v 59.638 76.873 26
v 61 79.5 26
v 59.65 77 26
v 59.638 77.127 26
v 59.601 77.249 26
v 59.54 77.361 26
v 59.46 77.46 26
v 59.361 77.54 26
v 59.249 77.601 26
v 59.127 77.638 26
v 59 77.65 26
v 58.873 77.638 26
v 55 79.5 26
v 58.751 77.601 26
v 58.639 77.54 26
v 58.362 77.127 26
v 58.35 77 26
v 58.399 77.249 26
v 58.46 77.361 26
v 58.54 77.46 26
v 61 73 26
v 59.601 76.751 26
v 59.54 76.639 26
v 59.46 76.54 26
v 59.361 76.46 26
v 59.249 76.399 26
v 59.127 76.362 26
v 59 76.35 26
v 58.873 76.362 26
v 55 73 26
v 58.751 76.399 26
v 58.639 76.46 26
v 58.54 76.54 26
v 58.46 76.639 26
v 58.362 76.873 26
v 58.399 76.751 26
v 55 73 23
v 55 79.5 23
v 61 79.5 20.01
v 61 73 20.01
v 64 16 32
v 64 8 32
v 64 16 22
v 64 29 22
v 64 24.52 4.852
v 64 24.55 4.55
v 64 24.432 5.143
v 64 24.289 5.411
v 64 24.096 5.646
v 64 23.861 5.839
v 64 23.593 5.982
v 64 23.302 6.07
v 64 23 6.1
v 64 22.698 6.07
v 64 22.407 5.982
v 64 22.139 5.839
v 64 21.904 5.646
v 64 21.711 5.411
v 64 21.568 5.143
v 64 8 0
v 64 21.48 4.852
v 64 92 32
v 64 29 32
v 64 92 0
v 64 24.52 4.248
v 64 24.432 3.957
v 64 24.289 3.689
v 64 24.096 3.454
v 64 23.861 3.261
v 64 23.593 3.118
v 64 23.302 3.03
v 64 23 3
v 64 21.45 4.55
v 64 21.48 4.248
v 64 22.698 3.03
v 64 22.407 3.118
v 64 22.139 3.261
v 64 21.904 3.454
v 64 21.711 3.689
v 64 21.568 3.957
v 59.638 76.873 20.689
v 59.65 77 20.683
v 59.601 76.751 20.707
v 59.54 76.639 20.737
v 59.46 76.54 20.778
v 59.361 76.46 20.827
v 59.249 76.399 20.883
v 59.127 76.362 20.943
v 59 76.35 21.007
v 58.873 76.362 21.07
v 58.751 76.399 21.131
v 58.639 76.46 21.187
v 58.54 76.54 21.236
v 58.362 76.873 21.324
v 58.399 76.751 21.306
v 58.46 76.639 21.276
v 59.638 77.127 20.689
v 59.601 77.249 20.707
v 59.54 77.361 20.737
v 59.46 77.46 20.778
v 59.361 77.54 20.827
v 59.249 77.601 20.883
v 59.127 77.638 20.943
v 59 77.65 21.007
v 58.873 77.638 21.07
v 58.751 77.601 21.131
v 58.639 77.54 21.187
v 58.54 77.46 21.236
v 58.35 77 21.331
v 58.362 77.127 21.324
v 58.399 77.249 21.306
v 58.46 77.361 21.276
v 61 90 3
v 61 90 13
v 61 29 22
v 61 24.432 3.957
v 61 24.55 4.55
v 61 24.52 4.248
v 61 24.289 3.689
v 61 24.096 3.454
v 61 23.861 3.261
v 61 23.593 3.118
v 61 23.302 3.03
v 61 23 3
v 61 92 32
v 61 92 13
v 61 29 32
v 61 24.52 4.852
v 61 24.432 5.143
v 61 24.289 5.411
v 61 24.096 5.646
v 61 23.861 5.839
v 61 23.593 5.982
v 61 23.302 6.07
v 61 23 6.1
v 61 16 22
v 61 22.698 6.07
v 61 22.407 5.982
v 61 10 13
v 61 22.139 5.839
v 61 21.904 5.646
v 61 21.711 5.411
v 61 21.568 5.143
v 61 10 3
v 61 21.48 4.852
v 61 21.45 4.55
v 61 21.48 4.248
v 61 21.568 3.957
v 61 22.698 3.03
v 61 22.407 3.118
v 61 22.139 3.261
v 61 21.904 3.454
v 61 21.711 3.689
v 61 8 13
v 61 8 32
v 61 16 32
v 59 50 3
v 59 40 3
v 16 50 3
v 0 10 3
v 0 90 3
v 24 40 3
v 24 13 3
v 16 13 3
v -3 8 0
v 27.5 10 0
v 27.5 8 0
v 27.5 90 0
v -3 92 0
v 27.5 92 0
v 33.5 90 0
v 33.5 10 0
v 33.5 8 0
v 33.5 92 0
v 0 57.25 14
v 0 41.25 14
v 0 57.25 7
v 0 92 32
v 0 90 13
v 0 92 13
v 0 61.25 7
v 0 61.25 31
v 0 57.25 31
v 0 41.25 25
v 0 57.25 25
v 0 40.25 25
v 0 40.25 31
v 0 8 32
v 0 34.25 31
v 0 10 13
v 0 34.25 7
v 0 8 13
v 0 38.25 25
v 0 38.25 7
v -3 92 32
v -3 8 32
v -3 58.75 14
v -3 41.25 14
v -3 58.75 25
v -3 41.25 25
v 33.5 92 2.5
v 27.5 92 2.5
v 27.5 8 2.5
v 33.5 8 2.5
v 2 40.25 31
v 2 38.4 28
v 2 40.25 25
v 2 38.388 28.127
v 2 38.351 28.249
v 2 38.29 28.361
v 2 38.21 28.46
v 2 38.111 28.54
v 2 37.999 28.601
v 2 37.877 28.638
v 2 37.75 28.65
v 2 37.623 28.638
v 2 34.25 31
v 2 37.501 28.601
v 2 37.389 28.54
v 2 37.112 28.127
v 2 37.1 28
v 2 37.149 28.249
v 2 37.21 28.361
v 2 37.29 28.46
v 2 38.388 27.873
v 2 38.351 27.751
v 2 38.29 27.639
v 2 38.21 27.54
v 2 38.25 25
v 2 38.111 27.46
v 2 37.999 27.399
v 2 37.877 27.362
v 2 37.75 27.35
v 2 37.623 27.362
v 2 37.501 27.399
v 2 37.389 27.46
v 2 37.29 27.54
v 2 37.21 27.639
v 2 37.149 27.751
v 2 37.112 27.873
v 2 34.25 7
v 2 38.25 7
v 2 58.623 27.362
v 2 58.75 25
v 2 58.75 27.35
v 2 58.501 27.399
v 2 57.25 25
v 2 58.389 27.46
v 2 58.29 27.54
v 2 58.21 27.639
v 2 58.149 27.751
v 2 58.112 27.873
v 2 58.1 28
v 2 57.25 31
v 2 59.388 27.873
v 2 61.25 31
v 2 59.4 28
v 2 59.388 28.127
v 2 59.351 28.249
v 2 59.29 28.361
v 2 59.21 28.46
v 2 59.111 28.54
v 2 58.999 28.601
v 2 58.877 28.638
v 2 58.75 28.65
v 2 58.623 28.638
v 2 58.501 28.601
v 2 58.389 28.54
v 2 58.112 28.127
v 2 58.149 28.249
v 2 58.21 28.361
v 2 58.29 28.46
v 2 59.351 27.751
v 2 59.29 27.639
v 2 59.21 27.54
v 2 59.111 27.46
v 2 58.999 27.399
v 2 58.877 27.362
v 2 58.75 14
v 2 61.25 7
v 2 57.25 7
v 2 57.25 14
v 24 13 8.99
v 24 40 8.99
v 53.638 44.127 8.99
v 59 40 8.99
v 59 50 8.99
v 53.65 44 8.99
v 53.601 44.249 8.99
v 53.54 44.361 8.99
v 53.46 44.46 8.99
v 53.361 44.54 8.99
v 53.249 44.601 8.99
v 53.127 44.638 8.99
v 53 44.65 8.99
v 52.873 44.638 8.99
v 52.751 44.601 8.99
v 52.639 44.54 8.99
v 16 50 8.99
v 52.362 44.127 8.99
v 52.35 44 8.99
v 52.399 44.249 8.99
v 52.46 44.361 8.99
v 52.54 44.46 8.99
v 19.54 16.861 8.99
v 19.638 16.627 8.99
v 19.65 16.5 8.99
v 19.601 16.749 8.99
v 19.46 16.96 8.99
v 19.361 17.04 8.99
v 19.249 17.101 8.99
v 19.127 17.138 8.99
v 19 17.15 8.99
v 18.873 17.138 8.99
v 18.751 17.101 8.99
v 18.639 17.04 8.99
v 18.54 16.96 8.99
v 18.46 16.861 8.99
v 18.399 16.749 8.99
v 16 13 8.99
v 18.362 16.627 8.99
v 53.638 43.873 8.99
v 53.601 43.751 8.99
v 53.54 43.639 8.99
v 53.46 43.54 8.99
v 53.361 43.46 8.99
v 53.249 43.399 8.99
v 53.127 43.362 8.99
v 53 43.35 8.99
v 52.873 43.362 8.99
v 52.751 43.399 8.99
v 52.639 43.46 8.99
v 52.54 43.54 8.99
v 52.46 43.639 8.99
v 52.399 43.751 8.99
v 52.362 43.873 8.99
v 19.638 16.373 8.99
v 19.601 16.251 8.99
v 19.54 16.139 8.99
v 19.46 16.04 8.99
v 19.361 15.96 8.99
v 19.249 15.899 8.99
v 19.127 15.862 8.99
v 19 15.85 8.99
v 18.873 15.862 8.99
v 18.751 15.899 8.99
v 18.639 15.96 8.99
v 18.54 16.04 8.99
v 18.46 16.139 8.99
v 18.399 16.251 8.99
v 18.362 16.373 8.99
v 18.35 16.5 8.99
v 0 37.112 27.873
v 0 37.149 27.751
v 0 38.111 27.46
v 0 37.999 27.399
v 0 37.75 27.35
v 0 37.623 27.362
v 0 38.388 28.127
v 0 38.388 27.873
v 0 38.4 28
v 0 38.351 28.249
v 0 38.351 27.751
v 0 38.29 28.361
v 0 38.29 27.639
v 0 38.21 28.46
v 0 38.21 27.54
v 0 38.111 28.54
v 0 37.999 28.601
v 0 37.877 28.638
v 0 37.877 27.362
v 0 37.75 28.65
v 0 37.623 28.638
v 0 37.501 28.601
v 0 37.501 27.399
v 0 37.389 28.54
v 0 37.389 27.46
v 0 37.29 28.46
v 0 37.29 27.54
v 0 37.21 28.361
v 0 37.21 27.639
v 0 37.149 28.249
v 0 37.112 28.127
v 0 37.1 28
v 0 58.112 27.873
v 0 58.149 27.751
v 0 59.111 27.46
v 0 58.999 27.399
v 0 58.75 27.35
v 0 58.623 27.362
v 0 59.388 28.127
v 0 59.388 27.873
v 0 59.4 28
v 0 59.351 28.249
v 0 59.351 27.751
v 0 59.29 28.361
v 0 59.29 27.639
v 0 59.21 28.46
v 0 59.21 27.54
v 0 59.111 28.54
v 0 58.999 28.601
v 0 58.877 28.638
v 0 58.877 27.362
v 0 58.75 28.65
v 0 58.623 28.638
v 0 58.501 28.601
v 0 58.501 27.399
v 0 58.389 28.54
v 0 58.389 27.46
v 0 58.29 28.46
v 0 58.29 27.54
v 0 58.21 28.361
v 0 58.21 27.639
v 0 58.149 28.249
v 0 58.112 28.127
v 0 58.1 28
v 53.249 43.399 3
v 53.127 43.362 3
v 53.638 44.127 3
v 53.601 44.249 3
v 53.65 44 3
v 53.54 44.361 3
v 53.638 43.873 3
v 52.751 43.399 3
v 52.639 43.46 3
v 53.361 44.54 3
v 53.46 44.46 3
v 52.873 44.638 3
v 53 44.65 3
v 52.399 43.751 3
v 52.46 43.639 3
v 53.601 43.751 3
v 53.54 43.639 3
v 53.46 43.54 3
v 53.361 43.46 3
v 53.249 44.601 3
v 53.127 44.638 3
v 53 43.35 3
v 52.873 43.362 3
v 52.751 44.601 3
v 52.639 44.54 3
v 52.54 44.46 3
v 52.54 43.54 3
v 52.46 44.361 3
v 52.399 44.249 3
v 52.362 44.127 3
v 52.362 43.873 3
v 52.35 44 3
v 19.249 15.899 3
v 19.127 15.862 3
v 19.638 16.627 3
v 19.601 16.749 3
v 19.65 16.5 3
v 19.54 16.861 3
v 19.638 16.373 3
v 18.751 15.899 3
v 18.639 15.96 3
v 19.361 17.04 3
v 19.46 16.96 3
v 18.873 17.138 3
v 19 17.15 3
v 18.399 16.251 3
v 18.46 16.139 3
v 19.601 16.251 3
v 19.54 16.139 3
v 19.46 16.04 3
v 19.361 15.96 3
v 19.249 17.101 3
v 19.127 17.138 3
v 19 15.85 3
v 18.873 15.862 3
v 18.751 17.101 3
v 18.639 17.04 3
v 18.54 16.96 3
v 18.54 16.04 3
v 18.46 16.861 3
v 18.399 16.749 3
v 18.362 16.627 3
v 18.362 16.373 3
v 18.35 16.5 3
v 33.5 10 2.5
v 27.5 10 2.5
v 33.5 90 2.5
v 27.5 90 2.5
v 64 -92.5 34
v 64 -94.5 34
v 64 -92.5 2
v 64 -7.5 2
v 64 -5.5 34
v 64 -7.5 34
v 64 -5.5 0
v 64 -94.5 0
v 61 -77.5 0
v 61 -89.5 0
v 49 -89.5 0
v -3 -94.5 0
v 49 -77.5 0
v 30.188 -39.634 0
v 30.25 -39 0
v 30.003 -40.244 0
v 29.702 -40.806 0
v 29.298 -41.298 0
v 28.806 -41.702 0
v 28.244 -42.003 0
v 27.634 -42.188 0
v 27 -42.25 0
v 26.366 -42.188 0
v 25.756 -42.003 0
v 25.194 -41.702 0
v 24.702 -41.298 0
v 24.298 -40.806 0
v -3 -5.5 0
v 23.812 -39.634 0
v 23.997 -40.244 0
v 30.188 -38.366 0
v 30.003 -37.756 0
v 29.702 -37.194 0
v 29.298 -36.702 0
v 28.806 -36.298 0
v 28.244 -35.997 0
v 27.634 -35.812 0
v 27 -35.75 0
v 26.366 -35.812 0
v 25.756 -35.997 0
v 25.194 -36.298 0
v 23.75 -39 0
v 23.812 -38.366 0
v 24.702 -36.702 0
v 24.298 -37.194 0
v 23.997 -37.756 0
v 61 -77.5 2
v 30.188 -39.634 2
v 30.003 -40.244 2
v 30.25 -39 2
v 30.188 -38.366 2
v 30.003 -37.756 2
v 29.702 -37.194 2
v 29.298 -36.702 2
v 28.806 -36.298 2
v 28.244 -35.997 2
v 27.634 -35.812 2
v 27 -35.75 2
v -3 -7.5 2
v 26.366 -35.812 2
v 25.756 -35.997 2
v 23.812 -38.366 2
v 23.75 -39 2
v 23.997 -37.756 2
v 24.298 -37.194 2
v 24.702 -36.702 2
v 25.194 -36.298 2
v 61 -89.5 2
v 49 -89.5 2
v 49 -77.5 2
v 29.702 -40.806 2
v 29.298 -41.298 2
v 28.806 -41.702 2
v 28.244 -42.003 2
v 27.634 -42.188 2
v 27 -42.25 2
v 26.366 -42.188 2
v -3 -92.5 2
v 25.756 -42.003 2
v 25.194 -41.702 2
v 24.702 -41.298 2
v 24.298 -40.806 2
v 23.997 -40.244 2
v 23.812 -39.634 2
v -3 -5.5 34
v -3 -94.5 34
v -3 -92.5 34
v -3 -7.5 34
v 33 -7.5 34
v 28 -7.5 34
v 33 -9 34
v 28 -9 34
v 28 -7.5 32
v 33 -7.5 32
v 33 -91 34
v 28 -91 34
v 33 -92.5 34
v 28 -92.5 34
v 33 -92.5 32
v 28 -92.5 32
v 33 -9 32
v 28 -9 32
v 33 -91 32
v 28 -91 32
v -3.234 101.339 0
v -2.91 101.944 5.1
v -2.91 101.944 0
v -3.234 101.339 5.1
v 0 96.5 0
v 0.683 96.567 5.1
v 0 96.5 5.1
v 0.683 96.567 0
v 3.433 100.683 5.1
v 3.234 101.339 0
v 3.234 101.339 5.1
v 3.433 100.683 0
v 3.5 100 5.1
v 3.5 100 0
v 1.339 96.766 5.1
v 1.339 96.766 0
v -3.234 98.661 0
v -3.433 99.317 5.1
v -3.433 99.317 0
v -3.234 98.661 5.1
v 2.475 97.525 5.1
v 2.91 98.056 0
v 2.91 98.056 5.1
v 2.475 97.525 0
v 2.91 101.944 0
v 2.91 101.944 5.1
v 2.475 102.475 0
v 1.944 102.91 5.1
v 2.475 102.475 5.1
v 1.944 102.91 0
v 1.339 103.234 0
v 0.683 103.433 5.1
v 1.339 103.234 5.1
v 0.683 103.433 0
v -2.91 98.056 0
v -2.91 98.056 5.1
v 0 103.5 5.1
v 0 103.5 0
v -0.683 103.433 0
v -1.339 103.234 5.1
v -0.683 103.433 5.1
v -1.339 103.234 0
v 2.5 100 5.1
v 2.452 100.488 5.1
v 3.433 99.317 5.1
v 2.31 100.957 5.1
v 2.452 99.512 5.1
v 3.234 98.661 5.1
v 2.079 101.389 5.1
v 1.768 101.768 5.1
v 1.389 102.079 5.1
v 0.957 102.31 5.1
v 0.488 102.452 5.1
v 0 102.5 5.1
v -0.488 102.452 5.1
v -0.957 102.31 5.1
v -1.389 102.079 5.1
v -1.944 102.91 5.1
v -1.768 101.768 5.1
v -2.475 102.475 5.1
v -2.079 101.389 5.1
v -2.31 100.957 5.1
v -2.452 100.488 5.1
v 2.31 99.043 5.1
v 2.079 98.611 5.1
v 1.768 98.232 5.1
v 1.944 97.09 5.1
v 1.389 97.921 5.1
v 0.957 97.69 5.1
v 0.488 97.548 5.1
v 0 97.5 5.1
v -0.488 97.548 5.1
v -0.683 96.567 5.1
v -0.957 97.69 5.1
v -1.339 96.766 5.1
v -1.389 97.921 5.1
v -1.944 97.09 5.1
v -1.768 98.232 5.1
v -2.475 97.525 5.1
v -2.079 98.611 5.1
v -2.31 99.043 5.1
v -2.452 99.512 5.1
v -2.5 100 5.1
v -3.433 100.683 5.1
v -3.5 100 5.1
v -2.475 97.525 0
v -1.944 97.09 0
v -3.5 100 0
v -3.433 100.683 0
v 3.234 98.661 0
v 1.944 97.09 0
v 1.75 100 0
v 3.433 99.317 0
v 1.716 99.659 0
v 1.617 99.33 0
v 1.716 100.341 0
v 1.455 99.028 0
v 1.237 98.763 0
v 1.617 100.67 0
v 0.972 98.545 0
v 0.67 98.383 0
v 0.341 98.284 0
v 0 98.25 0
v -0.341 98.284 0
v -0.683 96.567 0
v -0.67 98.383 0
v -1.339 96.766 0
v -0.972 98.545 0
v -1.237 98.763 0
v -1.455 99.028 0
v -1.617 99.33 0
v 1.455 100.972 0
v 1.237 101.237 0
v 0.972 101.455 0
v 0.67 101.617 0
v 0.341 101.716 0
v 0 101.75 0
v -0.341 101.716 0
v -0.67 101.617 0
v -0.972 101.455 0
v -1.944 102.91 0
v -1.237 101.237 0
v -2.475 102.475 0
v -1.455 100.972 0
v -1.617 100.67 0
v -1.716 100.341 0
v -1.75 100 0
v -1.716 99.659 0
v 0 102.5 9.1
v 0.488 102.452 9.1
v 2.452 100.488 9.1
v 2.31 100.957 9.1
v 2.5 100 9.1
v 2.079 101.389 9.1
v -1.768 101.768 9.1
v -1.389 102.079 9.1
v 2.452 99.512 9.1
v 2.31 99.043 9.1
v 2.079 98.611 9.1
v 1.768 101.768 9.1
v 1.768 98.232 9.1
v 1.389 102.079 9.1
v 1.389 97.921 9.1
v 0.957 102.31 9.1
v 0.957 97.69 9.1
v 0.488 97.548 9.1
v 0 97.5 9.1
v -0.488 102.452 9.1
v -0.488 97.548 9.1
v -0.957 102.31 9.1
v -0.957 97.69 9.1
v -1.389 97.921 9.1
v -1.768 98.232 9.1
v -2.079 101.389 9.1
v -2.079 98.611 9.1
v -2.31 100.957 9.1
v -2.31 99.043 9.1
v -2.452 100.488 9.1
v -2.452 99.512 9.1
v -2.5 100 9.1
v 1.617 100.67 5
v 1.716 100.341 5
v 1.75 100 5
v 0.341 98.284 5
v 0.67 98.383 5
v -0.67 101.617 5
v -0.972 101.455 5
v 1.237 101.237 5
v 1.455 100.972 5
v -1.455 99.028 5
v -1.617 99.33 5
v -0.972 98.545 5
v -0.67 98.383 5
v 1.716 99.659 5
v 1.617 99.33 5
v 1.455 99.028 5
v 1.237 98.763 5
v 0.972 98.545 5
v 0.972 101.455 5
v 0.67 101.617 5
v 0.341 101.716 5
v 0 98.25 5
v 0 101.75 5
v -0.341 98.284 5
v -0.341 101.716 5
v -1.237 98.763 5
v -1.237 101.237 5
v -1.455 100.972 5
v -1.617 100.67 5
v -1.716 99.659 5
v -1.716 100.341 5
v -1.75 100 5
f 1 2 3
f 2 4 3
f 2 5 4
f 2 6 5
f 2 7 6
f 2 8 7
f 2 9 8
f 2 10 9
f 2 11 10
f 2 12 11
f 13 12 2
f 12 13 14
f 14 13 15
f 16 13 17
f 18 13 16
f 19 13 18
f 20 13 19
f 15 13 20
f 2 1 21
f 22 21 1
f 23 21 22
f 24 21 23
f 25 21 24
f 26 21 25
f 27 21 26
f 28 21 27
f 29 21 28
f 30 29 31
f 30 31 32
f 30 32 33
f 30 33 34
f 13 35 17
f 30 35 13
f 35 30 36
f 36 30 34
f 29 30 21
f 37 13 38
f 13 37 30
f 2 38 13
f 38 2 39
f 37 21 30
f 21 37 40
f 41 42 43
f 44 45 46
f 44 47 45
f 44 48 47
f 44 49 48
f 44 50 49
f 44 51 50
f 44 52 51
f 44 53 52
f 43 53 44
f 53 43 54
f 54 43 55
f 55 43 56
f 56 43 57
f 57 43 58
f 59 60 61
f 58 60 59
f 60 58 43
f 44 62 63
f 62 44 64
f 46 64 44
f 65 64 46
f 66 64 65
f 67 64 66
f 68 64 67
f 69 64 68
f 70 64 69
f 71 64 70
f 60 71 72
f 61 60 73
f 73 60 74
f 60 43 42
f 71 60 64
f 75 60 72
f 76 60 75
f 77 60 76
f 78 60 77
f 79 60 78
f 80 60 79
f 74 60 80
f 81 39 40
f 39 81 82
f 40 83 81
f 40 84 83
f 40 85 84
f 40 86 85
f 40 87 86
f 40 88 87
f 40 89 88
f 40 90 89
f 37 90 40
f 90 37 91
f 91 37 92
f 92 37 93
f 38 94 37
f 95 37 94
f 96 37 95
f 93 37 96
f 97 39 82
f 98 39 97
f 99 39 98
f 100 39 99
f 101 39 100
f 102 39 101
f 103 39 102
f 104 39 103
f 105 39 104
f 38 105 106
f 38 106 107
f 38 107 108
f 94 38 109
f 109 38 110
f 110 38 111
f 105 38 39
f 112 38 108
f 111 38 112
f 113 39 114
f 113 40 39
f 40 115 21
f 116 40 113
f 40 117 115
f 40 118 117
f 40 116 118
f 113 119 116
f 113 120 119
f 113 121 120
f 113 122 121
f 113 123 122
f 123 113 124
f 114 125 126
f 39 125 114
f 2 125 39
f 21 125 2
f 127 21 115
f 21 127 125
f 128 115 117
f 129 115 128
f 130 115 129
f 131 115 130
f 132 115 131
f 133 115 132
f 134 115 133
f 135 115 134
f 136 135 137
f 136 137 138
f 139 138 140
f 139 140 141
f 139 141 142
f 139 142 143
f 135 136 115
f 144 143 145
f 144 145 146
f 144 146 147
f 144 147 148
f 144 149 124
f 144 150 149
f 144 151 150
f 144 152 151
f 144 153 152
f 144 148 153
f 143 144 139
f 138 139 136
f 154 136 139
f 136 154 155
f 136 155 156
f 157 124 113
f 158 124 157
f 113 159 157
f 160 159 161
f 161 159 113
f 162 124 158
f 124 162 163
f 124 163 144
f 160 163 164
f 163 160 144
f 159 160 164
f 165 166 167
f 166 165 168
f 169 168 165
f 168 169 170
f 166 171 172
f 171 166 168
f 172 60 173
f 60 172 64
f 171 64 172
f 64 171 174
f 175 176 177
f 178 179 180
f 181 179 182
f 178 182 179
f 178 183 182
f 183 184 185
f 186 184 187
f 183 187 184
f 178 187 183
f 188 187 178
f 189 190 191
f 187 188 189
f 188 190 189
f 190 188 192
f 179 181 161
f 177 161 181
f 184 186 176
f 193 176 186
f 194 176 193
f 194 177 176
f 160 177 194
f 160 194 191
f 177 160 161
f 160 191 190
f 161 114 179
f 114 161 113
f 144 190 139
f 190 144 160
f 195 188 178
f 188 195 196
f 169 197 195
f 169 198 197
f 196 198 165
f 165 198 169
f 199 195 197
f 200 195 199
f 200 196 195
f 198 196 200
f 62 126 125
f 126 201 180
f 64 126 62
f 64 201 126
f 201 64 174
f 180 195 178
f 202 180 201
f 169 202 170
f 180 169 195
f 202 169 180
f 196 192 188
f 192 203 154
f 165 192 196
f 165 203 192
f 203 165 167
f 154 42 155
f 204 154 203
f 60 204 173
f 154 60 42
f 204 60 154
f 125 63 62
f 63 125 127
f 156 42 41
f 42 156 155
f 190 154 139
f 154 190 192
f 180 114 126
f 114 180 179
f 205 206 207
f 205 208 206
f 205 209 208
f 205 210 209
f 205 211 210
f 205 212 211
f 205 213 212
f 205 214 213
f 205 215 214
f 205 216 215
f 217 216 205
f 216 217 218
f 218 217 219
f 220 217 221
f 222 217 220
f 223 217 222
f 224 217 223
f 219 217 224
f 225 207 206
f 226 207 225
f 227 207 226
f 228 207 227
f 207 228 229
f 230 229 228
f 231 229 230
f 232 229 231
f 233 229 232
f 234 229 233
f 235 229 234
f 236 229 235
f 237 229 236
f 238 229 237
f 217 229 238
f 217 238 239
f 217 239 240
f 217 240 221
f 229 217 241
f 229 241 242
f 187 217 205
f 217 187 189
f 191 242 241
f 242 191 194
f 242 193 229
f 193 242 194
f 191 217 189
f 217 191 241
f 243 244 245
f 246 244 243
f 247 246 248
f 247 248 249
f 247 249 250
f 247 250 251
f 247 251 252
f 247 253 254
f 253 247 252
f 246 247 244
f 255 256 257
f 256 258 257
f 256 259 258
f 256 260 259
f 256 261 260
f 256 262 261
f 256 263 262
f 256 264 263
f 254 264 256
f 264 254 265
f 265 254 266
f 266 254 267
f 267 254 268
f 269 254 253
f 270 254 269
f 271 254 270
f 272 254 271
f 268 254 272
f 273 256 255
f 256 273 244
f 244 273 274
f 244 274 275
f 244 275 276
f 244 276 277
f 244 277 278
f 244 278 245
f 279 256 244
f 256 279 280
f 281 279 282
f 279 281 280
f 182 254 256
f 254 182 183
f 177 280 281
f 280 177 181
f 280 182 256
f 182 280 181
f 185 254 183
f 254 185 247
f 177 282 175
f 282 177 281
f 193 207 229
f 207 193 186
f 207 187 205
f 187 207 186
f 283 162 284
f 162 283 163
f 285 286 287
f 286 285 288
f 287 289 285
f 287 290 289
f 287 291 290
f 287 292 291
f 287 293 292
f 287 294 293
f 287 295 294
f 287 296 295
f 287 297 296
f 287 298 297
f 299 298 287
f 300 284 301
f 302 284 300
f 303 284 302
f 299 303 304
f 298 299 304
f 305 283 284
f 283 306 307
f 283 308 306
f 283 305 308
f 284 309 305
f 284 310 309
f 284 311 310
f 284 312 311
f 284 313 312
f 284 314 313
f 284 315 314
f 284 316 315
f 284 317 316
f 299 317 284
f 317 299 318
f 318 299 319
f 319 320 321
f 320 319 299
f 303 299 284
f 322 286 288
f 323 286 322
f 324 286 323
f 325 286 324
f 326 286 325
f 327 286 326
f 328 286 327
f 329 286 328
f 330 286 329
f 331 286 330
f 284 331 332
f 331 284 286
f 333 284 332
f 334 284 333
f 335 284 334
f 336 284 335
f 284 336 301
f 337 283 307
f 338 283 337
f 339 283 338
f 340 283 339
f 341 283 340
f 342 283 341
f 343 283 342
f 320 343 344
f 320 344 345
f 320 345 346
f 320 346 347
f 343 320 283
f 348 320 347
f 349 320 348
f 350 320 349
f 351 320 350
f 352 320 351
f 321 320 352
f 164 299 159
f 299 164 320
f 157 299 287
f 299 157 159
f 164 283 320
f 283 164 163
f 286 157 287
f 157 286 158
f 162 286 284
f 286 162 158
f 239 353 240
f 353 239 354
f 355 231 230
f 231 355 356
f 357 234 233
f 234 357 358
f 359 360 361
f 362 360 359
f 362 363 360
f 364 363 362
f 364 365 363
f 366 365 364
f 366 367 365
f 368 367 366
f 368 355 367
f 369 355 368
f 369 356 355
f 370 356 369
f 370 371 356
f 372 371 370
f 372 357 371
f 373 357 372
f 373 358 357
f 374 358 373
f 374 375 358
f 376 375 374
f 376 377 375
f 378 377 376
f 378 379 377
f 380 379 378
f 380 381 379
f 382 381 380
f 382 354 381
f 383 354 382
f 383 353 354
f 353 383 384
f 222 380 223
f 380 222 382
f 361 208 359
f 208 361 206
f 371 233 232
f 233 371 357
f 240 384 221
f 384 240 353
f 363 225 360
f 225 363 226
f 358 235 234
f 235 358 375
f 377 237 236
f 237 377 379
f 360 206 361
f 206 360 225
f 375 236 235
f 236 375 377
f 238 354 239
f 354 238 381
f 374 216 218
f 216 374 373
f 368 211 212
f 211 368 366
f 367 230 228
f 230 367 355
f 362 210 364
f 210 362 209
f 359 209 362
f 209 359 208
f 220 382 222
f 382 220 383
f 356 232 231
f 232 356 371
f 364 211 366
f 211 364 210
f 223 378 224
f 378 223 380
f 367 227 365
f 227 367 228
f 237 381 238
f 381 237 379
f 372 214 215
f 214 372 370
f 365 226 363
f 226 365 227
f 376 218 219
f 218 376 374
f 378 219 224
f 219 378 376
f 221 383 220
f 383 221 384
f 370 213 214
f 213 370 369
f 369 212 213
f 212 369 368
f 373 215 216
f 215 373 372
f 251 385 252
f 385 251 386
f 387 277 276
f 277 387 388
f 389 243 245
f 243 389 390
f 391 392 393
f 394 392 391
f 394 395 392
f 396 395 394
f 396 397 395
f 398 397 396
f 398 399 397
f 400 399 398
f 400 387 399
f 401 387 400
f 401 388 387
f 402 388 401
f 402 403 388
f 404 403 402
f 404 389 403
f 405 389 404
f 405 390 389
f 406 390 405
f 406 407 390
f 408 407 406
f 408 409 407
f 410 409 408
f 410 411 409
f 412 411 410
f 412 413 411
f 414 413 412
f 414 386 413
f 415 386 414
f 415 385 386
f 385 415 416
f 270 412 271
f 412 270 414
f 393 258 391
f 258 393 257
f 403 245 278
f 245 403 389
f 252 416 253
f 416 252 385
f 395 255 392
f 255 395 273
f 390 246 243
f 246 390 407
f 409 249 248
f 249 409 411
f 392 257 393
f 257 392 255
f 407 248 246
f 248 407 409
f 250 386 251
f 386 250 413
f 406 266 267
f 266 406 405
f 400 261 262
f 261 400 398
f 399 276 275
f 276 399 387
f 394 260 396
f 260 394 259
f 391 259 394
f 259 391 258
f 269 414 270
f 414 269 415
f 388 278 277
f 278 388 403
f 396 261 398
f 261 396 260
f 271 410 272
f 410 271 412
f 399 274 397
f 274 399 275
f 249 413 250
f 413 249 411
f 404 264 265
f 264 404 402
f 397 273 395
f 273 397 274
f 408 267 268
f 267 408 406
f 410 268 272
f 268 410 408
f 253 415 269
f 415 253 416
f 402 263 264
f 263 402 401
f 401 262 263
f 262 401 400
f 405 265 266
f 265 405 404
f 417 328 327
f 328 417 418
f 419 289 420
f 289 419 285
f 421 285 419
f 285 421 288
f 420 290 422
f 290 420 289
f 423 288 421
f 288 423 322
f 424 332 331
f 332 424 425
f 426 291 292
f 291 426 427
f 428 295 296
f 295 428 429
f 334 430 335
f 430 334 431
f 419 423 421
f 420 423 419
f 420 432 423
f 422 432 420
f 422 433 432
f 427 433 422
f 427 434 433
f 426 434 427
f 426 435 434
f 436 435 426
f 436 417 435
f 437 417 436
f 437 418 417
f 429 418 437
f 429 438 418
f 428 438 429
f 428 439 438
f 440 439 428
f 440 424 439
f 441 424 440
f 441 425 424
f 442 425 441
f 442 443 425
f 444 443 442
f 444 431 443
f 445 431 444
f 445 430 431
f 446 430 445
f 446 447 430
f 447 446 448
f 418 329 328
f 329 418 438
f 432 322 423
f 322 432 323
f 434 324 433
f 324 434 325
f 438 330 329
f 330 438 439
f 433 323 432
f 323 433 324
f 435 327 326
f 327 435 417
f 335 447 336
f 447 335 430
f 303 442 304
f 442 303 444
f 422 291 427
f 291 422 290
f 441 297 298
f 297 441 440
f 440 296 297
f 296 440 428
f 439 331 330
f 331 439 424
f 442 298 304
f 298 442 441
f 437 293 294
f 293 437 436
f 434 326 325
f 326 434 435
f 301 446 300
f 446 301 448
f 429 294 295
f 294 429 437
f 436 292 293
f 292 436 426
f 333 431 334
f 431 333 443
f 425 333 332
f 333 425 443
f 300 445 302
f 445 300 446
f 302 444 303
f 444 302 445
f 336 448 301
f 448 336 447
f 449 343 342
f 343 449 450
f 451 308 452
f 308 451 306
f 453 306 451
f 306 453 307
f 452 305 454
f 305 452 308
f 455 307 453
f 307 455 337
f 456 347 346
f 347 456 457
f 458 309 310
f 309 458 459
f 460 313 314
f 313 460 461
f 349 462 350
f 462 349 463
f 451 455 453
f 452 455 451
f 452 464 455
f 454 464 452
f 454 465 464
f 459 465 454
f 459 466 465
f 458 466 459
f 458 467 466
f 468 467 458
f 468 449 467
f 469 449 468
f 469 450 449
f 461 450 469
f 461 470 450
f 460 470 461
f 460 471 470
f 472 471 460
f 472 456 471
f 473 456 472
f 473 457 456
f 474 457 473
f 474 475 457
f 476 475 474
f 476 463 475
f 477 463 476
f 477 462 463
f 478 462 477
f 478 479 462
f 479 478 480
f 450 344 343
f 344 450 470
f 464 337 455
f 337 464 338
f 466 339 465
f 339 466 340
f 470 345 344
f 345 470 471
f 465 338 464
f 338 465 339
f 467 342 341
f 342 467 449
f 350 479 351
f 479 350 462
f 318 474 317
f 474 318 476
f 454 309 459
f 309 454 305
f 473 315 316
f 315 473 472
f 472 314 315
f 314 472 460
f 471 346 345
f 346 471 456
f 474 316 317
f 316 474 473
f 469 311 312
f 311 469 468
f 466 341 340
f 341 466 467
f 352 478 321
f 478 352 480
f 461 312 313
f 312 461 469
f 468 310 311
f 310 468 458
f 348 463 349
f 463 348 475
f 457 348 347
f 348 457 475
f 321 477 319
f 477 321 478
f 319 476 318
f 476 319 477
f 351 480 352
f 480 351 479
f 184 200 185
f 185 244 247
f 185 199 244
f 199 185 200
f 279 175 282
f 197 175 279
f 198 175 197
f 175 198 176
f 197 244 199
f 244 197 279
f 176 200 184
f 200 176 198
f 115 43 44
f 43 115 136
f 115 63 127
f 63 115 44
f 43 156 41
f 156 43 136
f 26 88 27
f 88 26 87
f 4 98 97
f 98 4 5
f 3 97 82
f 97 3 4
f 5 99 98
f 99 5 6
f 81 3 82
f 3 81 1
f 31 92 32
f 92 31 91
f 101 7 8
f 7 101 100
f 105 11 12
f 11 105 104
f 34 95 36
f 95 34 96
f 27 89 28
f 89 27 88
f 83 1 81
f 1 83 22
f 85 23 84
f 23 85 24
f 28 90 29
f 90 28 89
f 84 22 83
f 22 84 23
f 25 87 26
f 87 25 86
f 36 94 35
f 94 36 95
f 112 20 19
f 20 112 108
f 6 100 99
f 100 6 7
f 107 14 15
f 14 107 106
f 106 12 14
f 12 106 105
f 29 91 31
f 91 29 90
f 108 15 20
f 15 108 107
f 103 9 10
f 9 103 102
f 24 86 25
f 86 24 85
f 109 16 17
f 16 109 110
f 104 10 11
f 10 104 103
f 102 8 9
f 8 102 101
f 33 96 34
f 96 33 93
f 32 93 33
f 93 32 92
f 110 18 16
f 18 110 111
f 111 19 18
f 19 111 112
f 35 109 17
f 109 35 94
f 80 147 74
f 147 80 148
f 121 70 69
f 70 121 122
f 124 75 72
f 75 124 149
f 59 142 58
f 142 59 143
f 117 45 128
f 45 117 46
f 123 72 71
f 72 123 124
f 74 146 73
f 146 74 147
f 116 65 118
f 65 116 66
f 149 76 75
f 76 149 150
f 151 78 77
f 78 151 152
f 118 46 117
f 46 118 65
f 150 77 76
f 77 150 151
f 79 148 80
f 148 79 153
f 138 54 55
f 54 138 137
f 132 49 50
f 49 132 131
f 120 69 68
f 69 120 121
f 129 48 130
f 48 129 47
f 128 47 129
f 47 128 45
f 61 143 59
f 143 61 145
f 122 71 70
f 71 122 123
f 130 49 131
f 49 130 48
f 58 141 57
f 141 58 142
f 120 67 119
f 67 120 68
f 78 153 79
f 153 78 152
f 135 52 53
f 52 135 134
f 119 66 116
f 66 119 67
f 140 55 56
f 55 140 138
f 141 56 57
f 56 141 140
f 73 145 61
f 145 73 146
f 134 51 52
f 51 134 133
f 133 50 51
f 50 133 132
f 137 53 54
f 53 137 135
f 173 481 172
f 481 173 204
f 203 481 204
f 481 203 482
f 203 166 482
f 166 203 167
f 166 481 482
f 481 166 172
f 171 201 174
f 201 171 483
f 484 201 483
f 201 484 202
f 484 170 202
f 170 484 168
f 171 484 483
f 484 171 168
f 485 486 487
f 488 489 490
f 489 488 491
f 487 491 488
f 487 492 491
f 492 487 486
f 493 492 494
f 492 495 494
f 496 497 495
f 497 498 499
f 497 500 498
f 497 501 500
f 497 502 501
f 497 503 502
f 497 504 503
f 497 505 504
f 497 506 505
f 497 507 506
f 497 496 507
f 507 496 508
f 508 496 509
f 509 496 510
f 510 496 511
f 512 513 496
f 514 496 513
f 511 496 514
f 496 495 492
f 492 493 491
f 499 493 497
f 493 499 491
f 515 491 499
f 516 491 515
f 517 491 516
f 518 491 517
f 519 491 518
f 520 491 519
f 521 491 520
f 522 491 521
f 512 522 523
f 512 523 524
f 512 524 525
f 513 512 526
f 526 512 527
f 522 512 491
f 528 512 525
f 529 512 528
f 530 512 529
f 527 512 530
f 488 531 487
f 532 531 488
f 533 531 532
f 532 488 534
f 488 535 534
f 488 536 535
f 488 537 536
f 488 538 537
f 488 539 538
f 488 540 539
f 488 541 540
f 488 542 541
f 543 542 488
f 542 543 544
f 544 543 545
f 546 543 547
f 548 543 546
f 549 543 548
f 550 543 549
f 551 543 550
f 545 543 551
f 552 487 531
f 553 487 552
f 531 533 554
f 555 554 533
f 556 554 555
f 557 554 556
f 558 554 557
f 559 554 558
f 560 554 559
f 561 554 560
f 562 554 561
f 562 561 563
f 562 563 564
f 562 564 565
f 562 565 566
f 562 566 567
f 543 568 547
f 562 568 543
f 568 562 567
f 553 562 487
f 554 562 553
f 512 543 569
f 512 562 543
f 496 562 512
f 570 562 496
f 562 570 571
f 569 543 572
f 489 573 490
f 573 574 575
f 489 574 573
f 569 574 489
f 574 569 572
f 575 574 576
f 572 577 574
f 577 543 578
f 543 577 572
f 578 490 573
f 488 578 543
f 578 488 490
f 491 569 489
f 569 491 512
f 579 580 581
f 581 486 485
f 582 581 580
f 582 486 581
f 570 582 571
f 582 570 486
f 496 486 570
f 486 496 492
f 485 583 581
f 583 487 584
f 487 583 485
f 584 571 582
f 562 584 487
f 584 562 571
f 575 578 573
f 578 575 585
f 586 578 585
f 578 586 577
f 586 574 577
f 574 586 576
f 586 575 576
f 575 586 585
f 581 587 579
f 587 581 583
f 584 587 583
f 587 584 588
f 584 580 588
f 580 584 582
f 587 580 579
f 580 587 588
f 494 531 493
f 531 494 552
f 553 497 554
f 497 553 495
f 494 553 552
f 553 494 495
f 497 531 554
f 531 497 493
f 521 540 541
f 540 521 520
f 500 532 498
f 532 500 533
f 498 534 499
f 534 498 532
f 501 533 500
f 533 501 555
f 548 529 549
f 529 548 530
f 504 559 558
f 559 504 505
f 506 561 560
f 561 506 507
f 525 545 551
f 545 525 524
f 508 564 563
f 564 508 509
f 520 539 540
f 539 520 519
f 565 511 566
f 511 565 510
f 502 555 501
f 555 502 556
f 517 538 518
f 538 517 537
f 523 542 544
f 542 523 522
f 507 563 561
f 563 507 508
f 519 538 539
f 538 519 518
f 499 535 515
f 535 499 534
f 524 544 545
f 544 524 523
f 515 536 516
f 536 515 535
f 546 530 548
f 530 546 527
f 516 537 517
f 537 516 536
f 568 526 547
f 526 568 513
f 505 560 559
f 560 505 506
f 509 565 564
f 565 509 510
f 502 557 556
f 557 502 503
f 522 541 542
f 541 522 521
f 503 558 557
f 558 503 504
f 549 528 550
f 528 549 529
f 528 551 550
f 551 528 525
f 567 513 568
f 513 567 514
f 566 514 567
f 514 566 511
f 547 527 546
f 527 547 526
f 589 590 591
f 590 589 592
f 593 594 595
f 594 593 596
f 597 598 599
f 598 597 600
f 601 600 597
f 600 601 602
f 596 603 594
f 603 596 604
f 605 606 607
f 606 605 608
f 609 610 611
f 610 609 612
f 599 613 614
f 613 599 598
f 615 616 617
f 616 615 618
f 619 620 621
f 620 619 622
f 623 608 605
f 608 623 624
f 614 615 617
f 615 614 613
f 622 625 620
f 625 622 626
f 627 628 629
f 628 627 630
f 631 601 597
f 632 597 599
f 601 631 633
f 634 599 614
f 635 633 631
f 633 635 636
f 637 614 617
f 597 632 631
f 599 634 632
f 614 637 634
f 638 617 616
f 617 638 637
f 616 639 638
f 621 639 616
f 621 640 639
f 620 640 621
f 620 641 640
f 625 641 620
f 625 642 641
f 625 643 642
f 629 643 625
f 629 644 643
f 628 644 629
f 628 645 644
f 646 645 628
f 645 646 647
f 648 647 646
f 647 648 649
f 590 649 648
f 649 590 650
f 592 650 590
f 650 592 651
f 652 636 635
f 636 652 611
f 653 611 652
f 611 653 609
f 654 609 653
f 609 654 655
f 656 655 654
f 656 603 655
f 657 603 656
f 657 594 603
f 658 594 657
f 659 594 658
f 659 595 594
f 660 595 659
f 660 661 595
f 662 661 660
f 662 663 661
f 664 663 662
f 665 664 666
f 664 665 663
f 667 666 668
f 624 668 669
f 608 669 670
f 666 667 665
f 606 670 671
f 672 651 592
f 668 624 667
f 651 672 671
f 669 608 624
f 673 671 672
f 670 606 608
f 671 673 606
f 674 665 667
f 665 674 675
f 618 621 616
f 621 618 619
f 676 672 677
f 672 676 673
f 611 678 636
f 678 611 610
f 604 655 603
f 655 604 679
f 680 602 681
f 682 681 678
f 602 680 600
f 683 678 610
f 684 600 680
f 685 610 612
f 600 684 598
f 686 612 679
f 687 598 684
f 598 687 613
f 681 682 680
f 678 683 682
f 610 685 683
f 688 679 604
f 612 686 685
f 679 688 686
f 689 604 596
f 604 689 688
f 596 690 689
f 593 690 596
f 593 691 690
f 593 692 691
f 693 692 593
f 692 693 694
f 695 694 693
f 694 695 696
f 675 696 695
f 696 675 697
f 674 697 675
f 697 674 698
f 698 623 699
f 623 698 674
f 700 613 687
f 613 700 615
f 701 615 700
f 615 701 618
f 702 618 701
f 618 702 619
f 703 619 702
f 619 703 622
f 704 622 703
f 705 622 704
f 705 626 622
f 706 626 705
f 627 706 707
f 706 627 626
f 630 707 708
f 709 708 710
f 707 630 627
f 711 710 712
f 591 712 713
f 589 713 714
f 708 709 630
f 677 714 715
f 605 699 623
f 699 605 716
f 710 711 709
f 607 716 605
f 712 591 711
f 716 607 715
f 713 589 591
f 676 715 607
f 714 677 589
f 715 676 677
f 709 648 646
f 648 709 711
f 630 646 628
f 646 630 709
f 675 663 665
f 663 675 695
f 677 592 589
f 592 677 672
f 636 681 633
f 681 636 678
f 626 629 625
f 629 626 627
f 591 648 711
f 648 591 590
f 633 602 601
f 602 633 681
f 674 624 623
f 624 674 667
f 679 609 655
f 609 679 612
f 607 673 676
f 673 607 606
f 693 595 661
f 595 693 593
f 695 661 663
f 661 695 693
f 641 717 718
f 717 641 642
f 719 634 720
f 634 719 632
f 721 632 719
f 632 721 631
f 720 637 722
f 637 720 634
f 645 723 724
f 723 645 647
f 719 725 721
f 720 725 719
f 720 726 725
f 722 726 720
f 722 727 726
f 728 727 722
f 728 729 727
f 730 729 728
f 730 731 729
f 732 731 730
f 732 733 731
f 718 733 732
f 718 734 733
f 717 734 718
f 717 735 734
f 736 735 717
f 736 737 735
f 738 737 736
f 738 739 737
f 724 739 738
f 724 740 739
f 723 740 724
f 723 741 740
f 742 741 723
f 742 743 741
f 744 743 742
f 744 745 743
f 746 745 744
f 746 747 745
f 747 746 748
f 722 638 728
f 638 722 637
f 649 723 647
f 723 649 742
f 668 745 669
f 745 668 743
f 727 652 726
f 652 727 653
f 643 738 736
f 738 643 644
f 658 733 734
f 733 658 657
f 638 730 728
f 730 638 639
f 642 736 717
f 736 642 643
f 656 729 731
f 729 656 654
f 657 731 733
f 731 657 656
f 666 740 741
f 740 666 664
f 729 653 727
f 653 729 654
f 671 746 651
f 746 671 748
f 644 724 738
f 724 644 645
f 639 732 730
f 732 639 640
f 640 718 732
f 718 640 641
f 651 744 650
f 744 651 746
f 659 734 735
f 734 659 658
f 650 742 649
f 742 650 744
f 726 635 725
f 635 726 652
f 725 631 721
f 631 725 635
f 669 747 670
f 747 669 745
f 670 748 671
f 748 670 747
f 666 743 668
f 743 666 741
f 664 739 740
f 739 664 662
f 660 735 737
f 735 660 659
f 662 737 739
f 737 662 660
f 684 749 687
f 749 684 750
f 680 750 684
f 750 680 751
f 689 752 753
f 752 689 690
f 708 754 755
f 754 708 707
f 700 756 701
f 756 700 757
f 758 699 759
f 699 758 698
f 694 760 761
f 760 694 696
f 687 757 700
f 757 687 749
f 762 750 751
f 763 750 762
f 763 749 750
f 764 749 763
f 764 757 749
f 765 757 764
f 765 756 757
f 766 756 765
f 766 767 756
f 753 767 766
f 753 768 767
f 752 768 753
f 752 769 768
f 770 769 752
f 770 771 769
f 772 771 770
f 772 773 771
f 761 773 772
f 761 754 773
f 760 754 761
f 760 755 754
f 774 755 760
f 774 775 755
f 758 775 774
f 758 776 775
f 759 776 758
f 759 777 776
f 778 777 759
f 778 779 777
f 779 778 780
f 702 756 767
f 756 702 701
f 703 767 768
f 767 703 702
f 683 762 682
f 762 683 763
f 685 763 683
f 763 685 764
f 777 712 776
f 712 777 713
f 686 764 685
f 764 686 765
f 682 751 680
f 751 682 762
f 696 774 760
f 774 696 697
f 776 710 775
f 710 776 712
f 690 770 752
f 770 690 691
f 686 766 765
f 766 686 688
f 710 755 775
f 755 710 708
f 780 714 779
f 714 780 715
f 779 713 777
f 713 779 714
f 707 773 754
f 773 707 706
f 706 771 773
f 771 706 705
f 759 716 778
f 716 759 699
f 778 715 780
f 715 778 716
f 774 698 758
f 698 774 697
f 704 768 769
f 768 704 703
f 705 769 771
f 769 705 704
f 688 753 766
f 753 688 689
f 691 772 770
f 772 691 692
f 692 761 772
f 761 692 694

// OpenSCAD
/*
* Open3DOLED is licensed under CC BY-NC-SA 4.0. To view a copy of this license, visit http://creativecommons.org/licenses/by-nc-sa/4.0/
*/

/*
*
* 3D MiniDIN3, RF, DLPLink Relay Case
*
* Version 0204a: added ability to add custom empty space on left side of main board for choke and other electronics
* Version 0203a: support for dlplink opt101 board
* Version 0201a: support for din3 to ir relay
* Version 0101a: support for rf to ir relay
* Todo:
*  - 
* 
* Notes:
*  - 
*
*/

include_dlplink_sensor = true;
include_eye_swap_button = true;
include_minidin3_cable_hole = true;

/* [Hidden:] */

$fn = 32;
ovr = 0.01;
big = 10;

bevel_d = 1.0;

mb_base_d = 2.5; // depth (needs to provide clearance for m1.4 4mm screws minus pcb depth)
main_pcb_wh = 20.0; // components and pcb // measured 17.6
mc_usbh_pz = 15;

main_pcb_px = 3;
base_wx = 61;
base_wy = 80;
base_wz = 3;
base_ww = 2; // wall width
base_wh = 10; // wall height
base_fww = 3; // front wall width
base_fwh = 29; // front wall height
base_bww = base_fww; // back wall width
base_bwh = base_fwh; // back wall height
rows_of_leds_populated = 2;
base_irh_wy = 17.5; // ir hole
base_irh_wz = (rows_of_leds_populated == 2 ? 11 : (rows_of_leds_populated == 1 ? 5 : 0));
base_irh_py = (base_wy - base_irh_wy) / 2;
base_irh_pz = 5;
base_irs_py = base_irh_py - 6; // 2.5 or 6 depending on side
base_irs_pz = base_irh_pz - 7;
base_irm_wx = 2; // ir mount
base_irm12_wy = 4;
base_irm12_wz = 24;
base_irm3_wy = 6;
base_irm3_wz = 6;
base_irm13_py = base_irs_py + 3 - base_irm12_wy;
base_irm2_py = base_irs_py + 26 - 4;
base_irm12_pz = base_irs_pz;
base_irm3_pz = base_irs_pz + 24 - base_irm3_wz;
base_usbh_wy = 13; // usb hole
base_usbh_wz = main_pcb_wh+mb_base_d-mc_usbh_pz+4;
base_usbh_py = 6;
base_usbh_pz = 13;
base_mbm_wz = 6; // main board mount
base_mbm1_wx = 8;
base_mbm1_wy = 37;
base_mbm1_px = 13+main_pcb_px;
base_mbm1_py = 3;
base_mbm2_wx = 43;
base_mbm2_wy = 10;
base_mbm2_px = base_mbm1_px;
base_mbm2_py = base_mbm1_py+base_mbm1_wy-base_mbm2_wy;
base_obm_wx = 6;
base_obm_px = base_wx+base_fww-base_bww-base_obm_wx;
base_obm_py = base_wy-base_ww-15;
base_obm_pdz = 6;
base_obma_wz = 3;
base_obma_wy = 6.5; // left side has 1.5mm less support due to opt101 throughhole pins sticking out
base_obmr_pdz = 3;

// -0.9 y +1.9 x

m1_4_wd_h_st = 1.3; // m1.4 self threading hole diameter
base_smh_list = [[2.5,21],[23.5,21]]; // y, z
main_pcb_wx = 37.5;
main_pcb_wy = 50;
main_pcb_py = 3.5;
base_mmh_list = [[34,main_pcb_wy-3.5+main_pcb_py+main_pcb_px],[6.5,main_pcb_wy-37.5+main_pcb_py+main_pcb_px]]; // y, x

base_obmmh_px = base_wx+base_fww-base_bww-2;
base_obmmh_py = base_wy-base_ww-11; 
base_obmh_wx = 12;
base_obmh_wy = 12;
base_obmh_px = base_wx+base_fww-base_bww-12;
base_obmh_py = base_obmmh_py+9-base_obmh_wy+3.5;
base_md3d_wd_h = 3.1;
base_md3d_py = 13;

cover_ww = 2;
cover_tol = 0.5;
cover_tab_wx = 5;
cover_tab_wy = 1.5;
cover_tab_wz = 2;
cover_esb_wd = 5;
cover_esbh_wd = cover_esb_wd+1.5;
cover_esbh_px = 27;
cover_esbh_py = base_mmh_list[0][0]-5;
cover_esbhi_wd = 3.5;
cover_esbo_wd = cover_esb_wd+2; // diameter of portion under case with lip to stop button falling out
cover_esbhi_wz = 5; // height of walls that surround inside button
cover_esbs_wz = 0.1; // height difference between top of inside and outside button
cover_esbt_wz = cover_ww+2; // height of top of button

module base() {
  difference() {
    union() {
      cube([base_wx,base_wy,base_wz]); // base
      translate([-base_fww,-base_ww,0])cube([base_fww,base_wy+2*base_ww,base_fwh+base_wz]); // front
      translate([base_wx,-base_ww,0])cube([base_bww,base_wy+2*base_ww,base_bwh+base_wz]); // back
      translate([-base_fww,-base_ww,0])cube([base_wx+base_ww+base_fww,base_ww,base_wh+base_wz]); // right
      translate([-base_fww,base_wy,0])cube([base_wx+base_ww+base_fww,base_ww,base_wh+base_wz]); // left
      translate([-ovr,base_irm13_py,base_irm12_pz+base_wz+base_mbm_wz])cube([base_irm_wx+ovr,base_irm12_wy,base_irm12_wz]); // ir mount 1
      translate([-ovr,base_irm2_py,base_irm12_pz+base_wz+base_mbm_wz])cube([base_irm_wx+ovr,base_irm12_wy,base_irm12_wz]); // ir mount 2
      translate([-ovr,base_irm13_py,base_irm3_pz+base_wz+base_mbm_wz])cube([base_irm_wx+ovr,base_irm3_wy,base_irm3_wz]); // ir mount 3
      translate([base_mbm1_px,base_mbm1_py,base_wz-ovr])cube([base_mbm1_wx,base_mbm1_wy,base_mbm_wz]);  // main board mount
      translate([base_mbm2_px,base_mbm2_py,base_wz-ovr])cube([base_mbm2_wx,base_mbm2_wy,base_mbm_wz]);  // main board mount
    if (include_dlplink_sensor) {
        translate([base_obm_px,base_obm_py,base_bwh+base_wz-base_obm_pdz-base_obma_wz])cube([base_obm_wx+ovr,base_obma_wy,base_obma_wz]);
   // opt board mount arm
        
        // opt board mount ramp
        hull() {
          translate([base_obm_px+base_obm_wx,base_obm_py,base_bwh+base_wz-base_obm_pdz-base_obmr_pdz-base_obma_wz+ovr])cube([base_bww,base_obma_wy,base_obma_wz]);
          translate([base_obm_px,base_obm_py,base_bwh+base_wz-base_obm_pdz-base_obma_wz])cube([base_obm_wx+ovr,base_obma_wy,ovr]); 
        }
      }
       
    }
    union() {
      translate([-base_fww-ovr,base_irh_py,base_irh_pz+base_wz+base_mbm_wz])cube([base_fww+base_irm_wx+2*ovr,base_irh_wy,base_irh_wz]);
      translate([base_wx-ovr,base_usbh_py,base_usbh_pz+base_wz+base_mbm_wz])cube([base_bww+2*ovr,base_usbh_wy,base_usbh_wz]);
      
      for (ss=base_smh_list) {
        translate([0,base_irs_py+ss[0],base_irs_pz+base_wz+base_mbm_wz+ss[1]])rotate([0,90,0])cylinder(h=base_irm_wx+ovr,d=m1_4_wd_h_st);
      }
      
      for (ss=base_mmh_list) {
        translate([ss[1],ss[0],base_wz])cylinder(h=10+base_mbm_wz+ovr,d=m1_4_wd_h_st);
      }
      
      if (include_dlplink_sensor) {
        translate([base_obmmh_px,base_obmmh_py,base_bwh+base_wz-base_obm_pdz-base_obmr_pdz-base_obma_wz-ovr])cylinder(h=base_obm_pdz+base_obmr_pdz+2*ovr,d=m1_4_wd_h_st); // opt board mount screw hole
      }
      if (include_minidin3_cable_hole) {
        translate([base_wx-ovr,base_md3d_py,base_wz+base_md3d_wd_h/2])rotate([0,90,0])cylinder(h=base_bww+2*ovr,d=base_md3d_wd_h);// minidin 3d sync out cable hole
      }
      
      translate([base_wx/2-cover_tab_wx/2-cover_tol,-base_ww-ovr,-ovr])cube([cover_tab_wx+2*cover_tol,cover_tab_wy+cover_tol+ovr,cover_tab_wz+cover_tol+ovr]); // right lock tab
      translate([base_wx/2-cover_tab_wx/2-cover_tol,base_wy+base_ww-cover_tab_wy-cover_tol,-ovr])cube([cover_tab_wx+2*cover_tol,cover_tab_wy+cover_tol+ovr,cover_tab_wz+cover_tol+ovr]); // left lock tab
    }
  }
}

module cover() {
  difference() {
    union() {
      translate([-base_fww,-base_ww-cover_tol-ovr,base_wz+base_fwh])cube([base_wx+base_bww+base_fww,base_wy+2*base_ww+2*cover_tol+2*ovr,cover_ww]); // top
      translate([-base_fww,-base_ww-cover_ww-cover_tol,0])cube([base_wx+base_bww+base_fww,cover_ww,base_wz+base_fwh+cover_ww]); // right
      translate([-base_fww,base_wy+base_ww+cover_tol,0])cube([base_wx+base_bww+base_fww,cover_ww,base_wz+base_fwh+cover_ww]); // left
      translate([base_wx/2-cover_tab_wx/2,-base_ww-cover_tol,0])cube([cover_tab_wx,cover_tab_wy,cover_tab_wz]); // right lock tab
      translate([base_wx/2-cover_tab_wx/2,base_wy+base_ww+cover_tol-cover_tab_wy,0])cube([cover_tab_wx,cover_tab_wy,cover_tab_wz]); // left lock tab
    }
    union() {
      if (include_dlplink_sensor) {
        translate([base_obmh_px,base_obmh_py,base_wz+base_fwh-ovr])cube([base_obmh_wx,base_obmh_wy,cover_ww+2*ovr]); // hole for dlplink optical sensor in case top, comment this line out if you don't need it
      }
      if (include_eye_swap_button) {
        translate([cover_esbh_px,cover_esbh_py,base_wz+base_fwh-ovr])cylinder(h=cover_ww+2*ovr,d=cover_esbh_wd); // hole for eye swap button on switch 4 in case top, comment this line out if you don't need it
      }
    }
  }
}

// SMD Switch used is 6x6x19 4Pin Tactile Tact Push Button Micro Switch Self-reset Switch
// https://www.aliexpress.com/item/1005005845072975.html
module button() {
  difference() {  
    union() {
      cylinder(h=cover_esbhi_wz+cover_esbs_wz,d=cover_esbo_wd); // button base
      translate([0,0,cover_esbhi_wz+cover_esbs_wz-ovr])cylinder(h=cover_esbt_wz+ovr,d=cover_esb_wd); // button top
    }
    union() {
      translate([0,0,-ovr])cylinder(h=cover_esbhi_wz+ovr,d=cover_esbhi_wd); // inside pocket for sitting on button
    }
  }
}

translate([0,10,0])
base();
translate([0,-10,base_wz+base_fwh+cover_ww])
rotate([180,0,0])
cover();
if (include_eye_swap_button) {
  translate([0,100,0])
  button();
}
